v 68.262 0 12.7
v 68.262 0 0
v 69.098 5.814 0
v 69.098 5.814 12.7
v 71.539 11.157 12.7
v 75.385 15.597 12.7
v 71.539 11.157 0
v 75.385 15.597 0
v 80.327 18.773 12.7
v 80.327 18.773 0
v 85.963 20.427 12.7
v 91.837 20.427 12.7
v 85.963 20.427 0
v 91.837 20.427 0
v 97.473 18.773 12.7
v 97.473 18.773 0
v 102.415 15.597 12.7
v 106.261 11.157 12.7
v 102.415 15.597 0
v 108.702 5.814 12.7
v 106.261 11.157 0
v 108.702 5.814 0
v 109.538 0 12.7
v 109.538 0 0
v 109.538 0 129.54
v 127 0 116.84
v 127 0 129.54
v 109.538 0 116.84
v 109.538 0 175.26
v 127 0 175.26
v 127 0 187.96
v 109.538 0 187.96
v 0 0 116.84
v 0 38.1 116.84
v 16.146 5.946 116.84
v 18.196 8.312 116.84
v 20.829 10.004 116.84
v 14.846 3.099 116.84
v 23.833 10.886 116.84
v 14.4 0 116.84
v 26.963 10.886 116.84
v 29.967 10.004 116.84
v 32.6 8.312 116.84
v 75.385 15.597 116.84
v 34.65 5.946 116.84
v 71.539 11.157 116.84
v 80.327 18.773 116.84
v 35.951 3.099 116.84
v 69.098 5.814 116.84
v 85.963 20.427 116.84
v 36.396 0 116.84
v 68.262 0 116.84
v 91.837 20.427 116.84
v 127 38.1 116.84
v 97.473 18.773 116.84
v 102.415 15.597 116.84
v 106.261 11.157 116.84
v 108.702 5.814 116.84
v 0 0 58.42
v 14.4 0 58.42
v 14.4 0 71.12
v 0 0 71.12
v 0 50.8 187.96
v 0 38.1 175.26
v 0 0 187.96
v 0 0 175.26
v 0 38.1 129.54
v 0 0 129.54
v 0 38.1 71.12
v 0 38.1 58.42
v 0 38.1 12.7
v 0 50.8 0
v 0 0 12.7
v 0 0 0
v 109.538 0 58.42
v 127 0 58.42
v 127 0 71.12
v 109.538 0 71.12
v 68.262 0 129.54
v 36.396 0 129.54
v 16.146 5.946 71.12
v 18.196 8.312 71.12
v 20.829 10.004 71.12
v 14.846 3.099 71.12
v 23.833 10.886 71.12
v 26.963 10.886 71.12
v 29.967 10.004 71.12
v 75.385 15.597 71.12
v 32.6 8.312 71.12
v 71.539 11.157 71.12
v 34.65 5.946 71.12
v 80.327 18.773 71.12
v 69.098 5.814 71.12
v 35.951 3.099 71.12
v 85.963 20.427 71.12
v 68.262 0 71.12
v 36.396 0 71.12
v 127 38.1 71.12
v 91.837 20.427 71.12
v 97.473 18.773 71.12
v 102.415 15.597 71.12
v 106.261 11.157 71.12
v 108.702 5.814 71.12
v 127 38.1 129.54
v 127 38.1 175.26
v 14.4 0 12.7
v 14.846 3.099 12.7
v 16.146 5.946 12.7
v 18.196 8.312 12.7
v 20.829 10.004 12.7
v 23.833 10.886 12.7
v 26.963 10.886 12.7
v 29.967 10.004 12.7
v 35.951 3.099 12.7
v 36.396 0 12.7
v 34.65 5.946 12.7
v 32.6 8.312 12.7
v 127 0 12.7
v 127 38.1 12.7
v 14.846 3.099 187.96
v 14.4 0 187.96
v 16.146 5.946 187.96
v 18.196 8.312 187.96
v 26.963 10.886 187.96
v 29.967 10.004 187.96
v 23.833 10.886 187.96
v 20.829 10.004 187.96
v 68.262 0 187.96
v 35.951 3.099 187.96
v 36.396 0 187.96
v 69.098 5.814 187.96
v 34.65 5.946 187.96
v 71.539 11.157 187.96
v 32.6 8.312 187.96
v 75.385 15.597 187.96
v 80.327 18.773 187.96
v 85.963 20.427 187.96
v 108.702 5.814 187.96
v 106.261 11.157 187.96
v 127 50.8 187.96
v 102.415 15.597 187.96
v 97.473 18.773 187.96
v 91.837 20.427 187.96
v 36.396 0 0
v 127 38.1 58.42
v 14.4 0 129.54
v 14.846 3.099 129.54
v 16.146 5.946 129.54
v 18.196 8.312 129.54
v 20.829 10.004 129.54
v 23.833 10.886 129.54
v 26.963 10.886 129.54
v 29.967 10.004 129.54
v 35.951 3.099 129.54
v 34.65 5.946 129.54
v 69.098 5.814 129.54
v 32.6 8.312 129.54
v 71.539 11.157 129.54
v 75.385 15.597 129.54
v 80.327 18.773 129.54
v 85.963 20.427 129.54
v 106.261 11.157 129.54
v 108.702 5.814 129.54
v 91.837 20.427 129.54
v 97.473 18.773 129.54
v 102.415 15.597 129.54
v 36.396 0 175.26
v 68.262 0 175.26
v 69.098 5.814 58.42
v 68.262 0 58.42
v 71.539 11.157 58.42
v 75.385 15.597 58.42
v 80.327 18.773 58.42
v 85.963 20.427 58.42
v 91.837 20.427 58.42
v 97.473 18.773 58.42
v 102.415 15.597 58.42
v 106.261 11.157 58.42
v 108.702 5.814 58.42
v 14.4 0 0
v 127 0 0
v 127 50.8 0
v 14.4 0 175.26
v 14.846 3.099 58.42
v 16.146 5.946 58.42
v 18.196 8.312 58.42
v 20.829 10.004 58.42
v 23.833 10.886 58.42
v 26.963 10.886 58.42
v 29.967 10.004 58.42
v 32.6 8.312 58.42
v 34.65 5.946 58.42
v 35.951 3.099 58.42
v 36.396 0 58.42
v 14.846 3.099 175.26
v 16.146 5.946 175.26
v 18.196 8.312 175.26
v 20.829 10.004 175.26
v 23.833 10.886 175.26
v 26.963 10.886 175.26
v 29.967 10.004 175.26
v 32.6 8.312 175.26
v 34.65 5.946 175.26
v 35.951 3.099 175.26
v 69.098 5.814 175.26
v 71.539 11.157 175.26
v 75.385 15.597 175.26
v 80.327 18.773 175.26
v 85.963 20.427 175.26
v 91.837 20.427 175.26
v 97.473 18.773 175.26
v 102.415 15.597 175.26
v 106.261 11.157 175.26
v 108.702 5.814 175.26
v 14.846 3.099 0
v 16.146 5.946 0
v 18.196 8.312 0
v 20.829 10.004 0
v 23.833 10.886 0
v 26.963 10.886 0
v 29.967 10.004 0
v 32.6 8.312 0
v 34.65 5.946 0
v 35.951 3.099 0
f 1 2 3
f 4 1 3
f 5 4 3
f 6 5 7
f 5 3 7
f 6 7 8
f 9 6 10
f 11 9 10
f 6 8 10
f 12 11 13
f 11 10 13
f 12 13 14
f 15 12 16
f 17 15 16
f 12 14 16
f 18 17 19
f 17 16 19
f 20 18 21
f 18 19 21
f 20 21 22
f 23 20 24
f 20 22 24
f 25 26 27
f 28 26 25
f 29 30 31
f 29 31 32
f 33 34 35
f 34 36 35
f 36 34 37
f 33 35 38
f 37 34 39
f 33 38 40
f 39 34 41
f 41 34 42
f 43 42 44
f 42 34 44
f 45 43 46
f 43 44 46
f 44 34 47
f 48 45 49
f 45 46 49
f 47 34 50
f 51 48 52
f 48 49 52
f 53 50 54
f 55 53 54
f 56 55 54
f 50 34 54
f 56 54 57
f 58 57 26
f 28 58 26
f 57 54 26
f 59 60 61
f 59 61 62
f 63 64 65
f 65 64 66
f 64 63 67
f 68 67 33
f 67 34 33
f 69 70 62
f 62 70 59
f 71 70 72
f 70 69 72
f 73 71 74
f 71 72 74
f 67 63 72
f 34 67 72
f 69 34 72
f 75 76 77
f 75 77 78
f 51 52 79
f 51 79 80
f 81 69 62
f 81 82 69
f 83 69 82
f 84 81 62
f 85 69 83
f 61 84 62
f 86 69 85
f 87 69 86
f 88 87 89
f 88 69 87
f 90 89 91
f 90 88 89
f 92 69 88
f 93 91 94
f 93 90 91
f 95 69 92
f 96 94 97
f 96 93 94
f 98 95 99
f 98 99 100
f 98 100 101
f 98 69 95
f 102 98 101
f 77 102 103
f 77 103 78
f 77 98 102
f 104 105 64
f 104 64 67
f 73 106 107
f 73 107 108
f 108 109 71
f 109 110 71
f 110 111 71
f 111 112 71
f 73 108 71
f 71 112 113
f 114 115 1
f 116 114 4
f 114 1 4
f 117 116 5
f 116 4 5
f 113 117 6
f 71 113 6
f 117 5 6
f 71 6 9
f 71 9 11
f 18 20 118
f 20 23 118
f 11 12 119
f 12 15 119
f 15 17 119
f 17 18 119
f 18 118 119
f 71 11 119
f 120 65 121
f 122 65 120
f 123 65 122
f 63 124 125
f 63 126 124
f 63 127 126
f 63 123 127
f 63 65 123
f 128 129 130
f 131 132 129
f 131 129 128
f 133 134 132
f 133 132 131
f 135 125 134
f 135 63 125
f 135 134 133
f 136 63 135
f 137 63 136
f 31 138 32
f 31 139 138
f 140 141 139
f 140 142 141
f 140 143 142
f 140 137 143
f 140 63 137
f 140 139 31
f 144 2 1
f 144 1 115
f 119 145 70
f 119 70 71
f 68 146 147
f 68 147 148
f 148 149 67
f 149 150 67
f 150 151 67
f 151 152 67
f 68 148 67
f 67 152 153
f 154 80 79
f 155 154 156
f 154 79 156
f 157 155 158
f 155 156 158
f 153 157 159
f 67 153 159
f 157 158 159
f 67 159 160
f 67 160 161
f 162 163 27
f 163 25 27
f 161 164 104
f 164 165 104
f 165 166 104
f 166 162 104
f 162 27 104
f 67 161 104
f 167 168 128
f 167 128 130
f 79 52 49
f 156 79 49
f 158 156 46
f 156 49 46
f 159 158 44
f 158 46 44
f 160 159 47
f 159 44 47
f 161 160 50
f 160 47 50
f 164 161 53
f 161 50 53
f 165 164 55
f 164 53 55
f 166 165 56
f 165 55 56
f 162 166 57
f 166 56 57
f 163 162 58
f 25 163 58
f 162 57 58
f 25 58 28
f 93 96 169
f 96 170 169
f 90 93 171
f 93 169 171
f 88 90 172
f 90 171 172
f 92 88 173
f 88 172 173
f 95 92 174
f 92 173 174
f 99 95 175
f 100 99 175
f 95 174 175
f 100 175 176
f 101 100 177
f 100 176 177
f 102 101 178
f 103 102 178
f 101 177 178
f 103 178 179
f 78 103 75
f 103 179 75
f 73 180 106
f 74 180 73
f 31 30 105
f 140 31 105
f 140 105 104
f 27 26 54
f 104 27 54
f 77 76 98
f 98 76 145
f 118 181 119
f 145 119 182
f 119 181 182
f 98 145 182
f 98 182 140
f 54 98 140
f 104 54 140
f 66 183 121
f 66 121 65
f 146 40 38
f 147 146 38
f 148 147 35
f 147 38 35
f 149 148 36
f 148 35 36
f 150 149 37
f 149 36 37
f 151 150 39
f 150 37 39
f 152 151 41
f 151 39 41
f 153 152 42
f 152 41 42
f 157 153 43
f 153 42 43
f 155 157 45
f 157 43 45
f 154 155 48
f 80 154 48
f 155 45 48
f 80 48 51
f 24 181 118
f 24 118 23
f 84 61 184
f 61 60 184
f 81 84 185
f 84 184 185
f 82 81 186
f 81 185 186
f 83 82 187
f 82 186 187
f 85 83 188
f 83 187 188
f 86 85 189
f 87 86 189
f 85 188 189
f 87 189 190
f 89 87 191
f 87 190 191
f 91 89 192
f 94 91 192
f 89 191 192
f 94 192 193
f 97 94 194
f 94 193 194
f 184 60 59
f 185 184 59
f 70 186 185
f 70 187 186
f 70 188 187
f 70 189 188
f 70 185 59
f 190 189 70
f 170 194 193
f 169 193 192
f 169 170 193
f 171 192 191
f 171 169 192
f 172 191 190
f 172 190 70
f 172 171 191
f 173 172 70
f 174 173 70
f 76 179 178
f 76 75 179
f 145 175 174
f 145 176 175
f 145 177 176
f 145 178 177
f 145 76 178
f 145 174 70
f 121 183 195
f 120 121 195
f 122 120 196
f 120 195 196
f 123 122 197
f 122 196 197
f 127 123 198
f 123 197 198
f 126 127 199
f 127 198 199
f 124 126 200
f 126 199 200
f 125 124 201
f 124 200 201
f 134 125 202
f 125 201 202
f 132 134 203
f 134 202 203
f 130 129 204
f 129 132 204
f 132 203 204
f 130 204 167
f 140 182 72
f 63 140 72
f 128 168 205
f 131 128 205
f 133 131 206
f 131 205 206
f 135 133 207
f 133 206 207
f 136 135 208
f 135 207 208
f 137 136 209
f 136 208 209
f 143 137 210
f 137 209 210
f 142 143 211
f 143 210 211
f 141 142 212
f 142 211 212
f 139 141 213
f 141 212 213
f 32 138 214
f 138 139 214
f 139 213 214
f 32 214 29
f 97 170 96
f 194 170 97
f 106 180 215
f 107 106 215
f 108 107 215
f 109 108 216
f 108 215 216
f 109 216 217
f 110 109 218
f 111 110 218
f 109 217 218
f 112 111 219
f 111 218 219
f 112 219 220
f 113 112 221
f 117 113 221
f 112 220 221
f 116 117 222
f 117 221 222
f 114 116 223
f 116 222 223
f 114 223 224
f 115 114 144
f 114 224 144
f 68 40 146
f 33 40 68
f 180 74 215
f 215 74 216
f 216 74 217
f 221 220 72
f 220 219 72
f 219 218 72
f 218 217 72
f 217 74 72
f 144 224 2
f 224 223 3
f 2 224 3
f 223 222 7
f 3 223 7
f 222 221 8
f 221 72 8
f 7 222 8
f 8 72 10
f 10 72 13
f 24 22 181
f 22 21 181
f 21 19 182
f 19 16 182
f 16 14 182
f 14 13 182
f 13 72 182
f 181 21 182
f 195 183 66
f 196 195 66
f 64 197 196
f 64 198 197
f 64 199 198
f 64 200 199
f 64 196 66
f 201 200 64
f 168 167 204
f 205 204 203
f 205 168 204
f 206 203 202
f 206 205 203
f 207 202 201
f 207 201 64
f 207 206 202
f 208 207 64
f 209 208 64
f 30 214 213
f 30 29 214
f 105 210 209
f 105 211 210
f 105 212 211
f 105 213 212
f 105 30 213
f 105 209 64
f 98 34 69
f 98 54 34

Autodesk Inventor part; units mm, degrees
ref_plane "YZ Plane" through (0, 0, 0) normal (1, 0, 0) x (0, 1, 0)
ref_plane "XZ Plane" through (0, 0, 0) normal (0, 1, 0) x (-1, 0, 0)
ref_plane "XY Plane" through (0, 0, 0) normal (0, 0, 1) x (1, 0, 0)
sketch "Sketch1" plane through (0, 0, 0) normal (0, 0, 1) x (1, 0, 0)
  line L0 (127, 0) -> (127, 50.8)
  line L1 (127, 50.8) -> (0, 50.8)
  line L2 (0, 50.8) -> (0, 0)
  arc A0 (109.5375, 0) -> (68.2625, 0) centre (88.9, 0) ccw
  arc A1 (36.3964, 0) -> (14.4, 0) centre (25.3982, 0) ccw
  line L3 (14.4, 0) -> (0, 0)
  line L4 (127, 0) -> (109.5375, 0)
  line L5 (68.2625, 0) -> (36.3964, 0)
  dimension "d0" = 127
  dimension "d2" = 41.275
  dimension "d25" = 38.1
  dimension "d26" = 21.9964
  dimension "d31" = 31.8661
  dimension "d32" = 14.4
  dimension "d33" = 50.8
extrude "Extrusion1" add sketch "Sketch1" along normal blind 187.96
sketch "Sketch3" plane through (127, 0, 0) normal (1, 0, 0) x (0, 0, -1)
  line L0 (0, 50.8) -> (-187.96, 50.8) projected
  line L1 (0, 0) -> (-187.96, 0) projected
  line L2 (-35.56, 38.1) -> (-35.56, 0)
  line L3 (0, 0) -> (-187.96, 0) projected
  line L4 (-93.98, 0) -> (-93.98, 38.1)
  line L5 (-152.4, 38.1) -> (-152.4, 0)
  line L6 (0, 0) -> (0, 50.8) projected
  line L7 (-187.96, 0) -> (-175.26, 0)
  line L8 (-175.26, 0) -> (-175.26, 38.1)
  line L9 (-175.26, 50.8) -> (-187.96, 50.8)
  line L10 (-187.96, 50.8) -> (-187.96, 0)
  line L11 (-116.84, 0) -> (-129.54, 0)
  line L12 (-129.54, 0) -> (-129.54, 38.1)
  line L13 (-129.54, 50.8) -> (-116.84, 50.8)
  line L14 (-116.84, 38.1) -> (-116.84, 0)
  line L15 (-35.56, 38.1) -> (-35.56, 0)
  line L16 (0, 0) -> (-12.7, 0)
  line L17 (-12.7, 0) -> (-12.7, 38.1)
  line L18 (-12.7, 50.8) -> (0, 50.8)
  line L19 (0, 50.8) -> (0, 0)
  line L20 (-71.12, 0) -> (-58.42, 0)
  line L21 (-58.42, 0) -> (-58.42, 38.1)
  line L22 (-58.42, 50.8) -> (-71.12, 50.8)
  line L23 (-71.12, 38.1) -> (-71.12, 0)
  line L24 (-187.96, 50.8) -> (-187.96, 0) projected
  line L25 (-187.96, 50.8) -> (0, 50.8)
  line L26 (-58.42, 38.1) -> (-12.7, 38.1)
  line L27 (-175.26, 38.1) -> (-129.54, 38.1)
  line L28 (-116.84, 38.1) -> (-71.12, 38.1)
  dimension "d15" = 35.56
  dimension "d16" = 93.98
  dimension "d17" = 152.4
  dimension "d18" = 12.7
  dimension "d34" = 38.1
extrude "Extrusion2" cut sketch "Sketch3" against normal blind 187.96 contours L1 L2 L26 L17 | L1 L21 L26 L2 | L1 L4 L28 L23 | L1 L14 L28 L4 | L1 L5 L27 L12 | L8 L27 L5 L1
properties part number "E.Engine Block Bottom"
